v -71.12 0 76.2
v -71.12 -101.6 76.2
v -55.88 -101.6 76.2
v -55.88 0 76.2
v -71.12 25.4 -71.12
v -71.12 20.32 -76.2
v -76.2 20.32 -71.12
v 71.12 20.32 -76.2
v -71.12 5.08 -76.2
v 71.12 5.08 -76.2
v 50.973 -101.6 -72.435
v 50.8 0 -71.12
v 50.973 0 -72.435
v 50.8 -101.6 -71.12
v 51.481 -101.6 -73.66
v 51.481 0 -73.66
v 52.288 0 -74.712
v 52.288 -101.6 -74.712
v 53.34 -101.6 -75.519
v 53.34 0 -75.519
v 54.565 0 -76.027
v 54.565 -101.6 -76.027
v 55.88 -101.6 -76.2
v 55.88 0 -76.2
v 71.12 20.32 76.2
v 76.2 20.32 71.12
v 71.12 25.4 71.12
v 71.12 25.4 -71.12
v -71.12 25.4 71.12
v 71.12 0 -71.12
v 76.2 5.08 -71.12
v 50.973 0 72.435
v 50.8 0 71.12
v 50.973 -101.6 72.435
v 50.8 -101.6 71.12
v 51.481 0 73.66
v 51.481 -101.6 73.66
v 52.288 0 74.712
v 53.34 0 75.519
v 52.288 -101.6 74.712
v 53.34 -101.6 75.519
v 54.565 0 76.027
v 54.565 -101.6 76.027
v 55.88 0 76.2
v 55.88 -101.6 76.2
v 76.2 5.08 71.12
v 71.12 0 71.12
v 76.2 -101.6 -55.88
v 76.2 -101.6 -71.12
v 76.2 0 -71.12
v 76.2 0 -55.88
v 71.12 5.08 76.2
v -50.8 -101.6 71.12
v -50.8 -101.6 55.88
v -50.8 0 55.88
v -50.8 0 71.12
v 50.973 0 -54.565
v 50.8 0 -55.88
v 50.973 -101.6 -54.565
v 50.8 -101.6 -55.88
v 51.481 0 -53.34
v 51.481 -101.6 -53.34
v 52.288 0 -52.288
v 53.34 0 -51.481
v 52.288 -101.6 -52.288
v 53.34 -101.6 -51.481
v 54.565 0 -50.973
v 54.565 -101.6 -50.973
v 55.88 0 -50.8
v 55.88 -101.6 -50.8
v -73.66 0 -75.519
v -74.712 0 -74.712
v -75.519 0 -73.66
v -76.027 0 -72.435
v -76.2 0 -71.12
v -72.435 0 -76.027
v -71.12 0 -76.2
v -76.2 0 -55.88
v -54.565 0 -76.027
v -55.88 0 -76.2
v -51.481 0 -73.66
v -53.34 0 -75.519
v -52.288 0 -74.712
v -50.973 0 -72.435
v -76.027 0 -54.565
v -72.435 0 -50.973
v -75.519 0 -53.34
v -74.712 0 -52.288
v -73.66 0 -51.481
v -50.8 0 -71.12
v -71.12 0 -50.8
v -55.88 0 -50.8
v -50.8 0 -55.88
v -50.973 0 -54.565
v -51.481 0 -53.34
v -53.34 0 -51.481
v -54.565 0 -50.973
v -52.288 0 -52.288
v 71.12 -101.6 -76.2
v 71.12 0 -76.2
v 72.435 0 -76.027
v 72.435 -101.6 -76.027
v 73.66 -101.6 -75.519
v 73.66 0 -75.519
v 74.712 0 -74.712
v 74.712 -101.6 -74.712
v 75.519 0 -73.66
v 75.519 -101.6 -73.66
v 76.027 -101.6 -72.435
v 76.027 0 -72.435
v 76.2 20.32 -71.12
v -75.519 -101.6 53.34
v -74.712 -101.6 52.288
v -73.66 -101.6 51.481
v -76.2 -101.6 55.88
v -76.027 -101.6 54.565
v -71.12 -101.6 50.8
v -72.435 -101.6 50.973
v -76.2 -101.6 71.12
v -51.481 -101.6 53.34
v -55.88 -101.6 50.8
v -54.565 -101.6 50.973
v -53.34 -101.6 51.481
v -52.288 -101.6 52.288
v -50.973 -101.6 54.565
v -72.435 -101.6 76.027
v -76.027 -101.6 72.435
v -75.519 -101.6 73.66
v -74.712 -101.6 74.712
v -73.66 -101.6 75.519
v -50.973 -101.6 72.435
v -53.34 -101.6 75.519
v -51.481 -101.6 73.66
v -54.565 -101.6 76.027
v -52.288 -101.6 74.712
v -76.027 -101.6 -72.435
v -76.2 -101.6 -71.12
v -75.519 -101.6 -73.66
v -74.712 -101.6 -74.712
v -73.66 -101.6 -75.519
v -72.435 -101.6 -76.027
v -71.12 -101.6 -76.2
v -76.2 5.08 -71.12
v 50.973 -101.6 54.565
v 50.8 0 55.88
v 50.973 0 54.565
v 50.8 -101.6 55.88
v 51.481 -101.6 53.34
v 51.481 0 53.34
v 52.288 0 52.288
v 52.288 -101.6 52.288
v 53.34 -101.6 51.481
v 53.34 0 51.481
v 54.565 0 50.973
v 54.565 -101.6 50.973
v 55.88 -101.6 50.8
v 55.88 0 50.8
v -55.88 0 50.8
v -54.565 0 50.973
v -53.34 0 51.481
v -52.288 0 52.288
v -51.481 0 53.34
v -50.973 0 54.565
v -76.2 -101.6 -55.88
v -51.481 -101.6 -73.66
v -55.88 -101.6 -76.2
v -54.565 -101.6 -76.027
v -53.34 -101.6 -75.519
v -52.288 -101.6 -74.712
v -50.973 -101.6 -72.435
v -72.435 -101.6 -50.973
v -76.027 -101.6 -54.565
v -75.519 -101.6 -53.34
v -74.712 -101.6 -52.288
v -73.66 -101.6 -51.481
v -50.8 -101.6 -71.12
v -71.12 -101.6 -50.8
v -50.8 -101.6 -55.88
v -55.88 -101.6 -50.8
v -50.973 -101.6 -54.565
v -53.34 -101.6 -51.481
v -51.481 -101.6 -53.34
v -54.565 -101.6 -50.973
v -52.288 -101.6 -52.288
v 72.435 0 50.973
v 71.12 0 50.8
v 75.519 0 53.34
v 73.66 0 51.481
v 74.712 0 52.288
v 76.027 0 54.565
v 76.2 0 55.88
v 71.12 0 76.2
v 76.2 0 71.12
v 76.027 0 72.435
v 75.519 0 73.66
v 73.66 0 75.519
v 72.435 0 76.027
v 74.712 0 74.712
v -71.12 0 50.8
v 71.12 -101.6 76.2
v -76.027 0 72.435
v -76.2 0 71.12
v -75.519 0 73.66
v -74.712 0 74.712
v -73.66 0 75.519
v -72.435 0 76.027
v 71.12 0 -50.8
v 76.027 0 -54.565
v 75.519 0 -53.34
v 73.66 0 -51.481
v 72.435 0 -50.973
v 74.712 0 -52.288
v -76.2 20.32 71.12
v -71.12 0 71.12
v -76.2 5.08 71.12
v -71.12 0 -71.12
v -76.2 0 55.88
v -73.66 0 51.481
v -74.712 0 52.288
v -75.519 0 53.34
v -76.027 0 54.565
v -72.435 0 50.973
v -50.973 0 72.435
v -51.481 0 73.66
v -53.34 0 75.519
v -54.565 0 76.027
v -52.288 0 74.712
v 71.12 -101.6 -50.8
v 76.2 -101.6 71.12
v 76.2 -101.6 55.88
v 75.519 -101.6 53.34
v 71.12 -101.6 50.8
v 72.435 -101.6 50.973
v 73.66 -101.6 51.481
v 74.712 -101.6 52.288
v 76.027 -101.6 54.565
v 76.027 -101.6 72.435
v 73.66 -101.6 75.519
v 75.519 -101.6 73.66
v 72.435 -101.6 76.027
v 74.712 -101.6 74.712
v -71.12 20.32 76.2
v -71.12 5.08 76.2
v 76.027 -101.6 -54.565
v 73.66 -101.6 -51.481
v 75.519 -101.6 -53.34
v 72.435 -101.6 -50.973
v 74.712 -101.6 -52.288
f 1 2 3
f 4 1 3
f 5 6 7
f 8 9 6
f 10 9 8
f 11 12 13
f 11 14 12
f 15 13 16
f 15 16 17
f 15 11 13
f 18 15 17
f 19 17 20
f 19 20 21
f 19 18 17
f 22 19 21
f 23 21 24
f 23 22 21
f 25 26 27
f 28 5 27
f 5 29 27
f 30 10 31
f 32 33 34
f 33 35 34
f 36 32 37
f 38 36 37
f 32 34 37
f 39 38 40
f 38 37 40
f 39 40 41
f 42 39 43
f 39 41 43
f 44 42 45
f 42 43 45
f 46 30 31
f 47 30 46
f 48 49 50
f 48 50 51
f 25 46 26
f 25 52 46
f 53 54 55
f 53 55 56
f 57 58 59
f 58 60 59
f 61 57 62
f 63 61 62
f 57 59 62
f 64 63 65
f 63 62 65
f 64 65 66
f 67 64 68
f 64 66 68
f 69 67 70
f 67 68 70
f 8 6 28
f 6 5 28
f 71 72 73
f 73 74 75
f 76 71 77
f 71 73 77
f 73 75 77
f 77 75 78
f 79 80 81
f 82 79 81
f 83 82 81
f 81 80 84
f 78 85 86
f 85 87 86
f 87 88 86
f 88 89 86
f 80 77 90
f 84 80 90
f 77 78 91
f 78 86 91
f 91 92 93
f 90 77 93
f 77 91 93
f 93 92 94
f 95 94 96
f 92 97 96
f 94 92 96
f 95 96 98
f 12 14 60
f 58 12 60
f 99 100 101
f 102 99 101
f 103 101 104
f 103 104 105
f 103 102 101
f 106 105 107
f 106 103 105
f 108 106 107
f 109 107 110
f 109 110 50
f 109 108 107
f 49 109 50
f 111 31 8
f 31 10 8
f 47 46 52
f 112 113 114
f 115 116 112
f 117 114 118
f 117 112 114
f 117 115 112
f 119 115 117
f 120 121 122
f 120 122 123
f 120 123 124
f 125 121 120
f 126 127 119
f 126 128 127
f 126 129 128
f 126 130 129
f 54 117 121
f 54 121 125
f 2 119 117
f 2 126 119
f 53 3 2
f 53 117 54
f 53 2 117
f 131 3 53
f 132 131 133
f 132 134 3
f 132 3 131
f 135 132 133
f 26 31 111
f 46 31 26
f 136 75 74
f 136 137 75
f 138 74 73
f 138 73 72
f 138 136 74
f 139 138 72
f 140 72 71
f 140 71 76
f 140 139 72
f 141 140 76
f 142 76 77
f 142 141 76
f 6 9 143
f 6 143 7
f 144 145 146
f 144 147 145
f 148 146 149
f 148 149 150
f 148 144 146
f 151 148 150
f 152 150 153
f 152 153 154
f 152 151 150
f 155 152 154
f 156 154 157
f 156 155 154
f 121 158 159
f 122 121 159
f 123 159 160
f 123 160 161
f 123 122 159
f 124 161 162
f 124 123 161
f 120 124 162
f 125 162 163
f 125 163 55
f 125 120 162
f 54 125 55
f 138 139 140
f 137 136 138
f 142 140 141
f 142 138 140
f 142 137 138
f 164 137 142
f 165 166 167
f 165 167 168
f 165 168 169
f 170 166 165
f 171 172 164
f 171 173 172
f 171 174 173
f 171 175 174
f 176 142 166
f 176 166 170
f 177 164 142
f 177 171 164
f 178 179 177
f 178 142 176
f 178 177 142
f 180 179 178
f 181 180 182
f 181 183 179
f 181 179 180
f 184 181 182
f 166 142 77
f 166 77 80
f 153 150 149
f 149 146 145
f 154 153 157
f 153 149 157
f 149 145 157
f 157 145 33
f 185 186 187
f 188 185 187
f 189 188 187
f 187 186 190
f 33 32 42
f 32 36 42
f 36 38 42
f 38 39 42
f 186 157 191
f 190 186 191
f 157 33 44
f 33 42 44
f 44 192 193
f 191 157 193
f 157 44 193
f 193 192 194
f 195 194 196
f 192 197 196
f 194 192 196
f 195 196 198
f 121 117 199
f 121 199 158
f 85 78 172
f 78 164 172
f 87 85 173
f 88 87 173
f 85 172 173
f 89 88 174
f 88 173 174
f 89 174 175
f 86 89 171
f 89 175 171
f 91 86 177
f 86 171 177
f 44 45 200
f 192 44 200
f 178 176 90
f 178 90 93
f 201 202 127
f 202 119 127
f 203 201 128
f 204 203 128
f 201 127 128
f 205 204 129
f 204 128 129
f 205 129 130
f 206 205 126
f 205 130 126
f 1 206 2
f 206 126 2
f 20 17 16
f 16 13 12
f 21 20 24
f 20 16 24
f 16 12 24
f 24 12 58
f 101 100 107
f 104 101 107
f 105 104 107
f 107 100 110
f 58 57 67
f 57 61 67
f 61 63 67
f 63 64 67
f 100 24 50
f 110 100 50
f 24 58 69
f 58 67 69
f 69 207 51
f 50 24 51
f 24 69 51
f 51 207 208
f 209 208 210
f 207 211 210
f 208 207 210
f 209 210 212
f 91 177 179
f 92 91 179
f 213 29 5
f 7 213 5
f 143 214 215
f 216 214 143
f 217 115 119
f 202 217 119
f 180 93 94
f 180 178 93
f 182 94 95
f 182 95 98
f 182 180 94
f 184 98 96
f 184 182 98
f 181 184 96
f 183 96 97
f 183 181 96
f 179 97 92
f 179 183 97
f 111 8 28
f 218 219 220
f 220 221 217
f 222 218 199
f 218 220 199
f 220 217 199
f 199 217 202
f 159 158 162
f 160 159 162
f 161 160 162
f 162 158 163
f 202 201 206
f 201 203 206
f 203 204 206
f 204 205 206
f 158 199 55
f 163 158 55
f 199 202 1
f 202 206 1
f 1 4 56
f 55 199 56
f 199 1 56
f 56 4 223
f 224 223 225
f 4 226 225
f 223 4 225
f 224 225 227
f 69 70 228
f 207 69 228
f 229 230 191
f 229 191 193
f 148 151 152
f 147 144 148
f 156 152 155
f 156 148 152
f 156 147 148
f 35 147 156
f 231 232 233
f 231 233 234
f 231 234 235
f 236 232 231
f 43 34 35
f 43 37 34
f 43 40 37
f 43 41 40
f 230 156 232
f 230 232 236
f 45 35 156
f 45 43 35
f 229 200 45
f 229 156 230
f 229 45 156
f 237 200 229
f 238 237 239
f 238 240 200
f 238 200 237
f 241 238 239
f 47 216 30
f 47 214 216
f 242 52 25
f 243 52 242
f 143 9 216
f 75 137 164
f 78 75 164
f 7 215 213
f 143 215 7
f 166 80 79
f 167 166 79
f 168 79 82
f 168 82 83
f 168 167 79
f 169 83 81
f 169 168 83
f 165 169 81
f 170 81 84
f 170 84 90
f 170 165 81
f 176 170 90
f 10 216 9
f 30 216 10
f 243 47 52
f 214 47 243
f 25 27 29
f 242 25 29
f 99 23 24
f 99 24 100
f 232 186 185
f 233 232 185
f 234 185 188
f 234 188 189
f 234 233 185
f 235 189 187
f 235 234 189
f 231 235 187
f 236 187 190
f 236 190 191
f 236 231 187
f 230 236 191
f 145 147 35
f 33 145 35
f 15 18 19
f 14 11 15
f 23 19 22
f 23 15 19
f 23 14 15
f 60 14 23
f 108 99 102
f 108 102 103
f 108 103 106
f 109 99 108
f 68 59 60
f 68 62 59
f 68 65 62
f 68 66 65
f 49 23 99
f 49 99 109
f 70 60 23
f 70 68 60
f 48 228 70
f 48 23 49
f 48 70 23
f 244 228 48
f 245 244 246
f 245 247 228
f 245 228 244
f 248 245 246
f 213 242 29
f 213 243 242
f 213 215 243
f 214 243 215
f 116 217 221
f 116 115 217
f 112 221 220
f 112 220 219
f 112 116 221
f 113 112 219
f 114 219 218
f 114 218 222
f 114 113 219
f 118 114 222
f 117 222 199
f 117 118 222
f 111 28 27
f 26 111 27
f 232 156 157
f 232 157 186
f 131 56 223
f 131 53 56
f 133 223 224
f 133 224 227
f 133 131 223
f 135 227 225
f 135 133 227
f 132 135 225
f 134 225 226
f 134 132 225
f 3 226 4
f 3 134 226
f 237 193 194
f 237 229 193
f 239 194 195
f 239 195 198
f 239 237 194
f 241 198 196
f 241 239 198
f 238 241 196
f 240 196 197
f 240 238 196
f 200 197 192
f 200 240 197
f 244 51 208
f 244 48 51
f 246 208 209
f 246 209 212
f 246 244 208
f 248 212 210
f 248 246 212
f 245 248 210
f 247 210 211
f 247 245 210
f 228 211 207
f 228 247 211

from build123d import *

# Parameters (mm, degrees)
F0_W     = 25.4
F0_H     = 25.4
F1_DEPTH = 101.6
F2_DEPTH = 25.4
F3_R     = 5.08
F4_R     = 5.08
F5_R     = 5.08
F6_R     = 5.08
F7_SIZE  = 5.08


with BuildPart() as f1:
    # F0 (on Front) → F1 (new body)
    with BuildSketch(Plane.XZ):
        with Locations((-63.5, 63.5)):
            Rectangle(F0_W, F0_H)
        with Locations((63.5, 63.5)):
            Rectangle(F0_W, F0_H)
        with Locations((63.5, -63.5)):
            Rectangle(F0_W, F0_H)
        with Locations((-63.5, -63.5)):
            Rectangle(F0_W, F0_H)
    extrude(amount=F1_DEPTH)

    # F3
    f3_edges = [f1.edges().sort_by_distance(p)[0] for p in [
        (76.2, -50.8, -50.8),
        (76.2, -50.8, -76.2),
        (50.8, -50.8, -76.2),
        (50.8, -50.8, -50.8),
    ]]
    fillet(f3_edges, radius=F3_R)

    # F4
    f4_edges = [f1.edges().sort_by_distance(p)[0] for p in [
        (-76.2, -50.8, -76.2),
        (-76.2, -50.8, -50.8),
        (-50.8, -50.8, -76.2),
        (-50.8, -50.8, -50.8),
    ]]
    fillet(f4_edges, radius=F4_R)

    # F5
    f5_edges = [f1.edges().sort_by_distance(p)[0] for p in [
        (76.2, -50.8, 50.8),
        (50.8, -50.8, 50.8),
        (76.2, -50.8, 76.2),
        (50.8, -50.8, 76.2),
    ]]
    fillet(f5_edges, radius=F5_R)

    # F6
    f6_edges = [f1.edges().sort_by_distance(p)[0] for p in [
        (-76.2, -50.8, 76.2),
        (-50.8, -50.8, 76.2),
        (-50.8, -50.8, 50.8),
        (-76.2, -50.8, 50.8),
    ]]
    fillet(f6_edges, radius=F6_R)


with BuildPart() as f2:
    # F0 (on Front) → F2 (new body)
    with BuildSketch(Plane.XZ):
        Polygon((50.8, 76.2), (-50.8, 76.2), (-50.8, 50.8), (-76.2, 50.8), (-76.2, -50.8), (-50.8, -50.8), (-50.8, -76.2), (50.8, -76.2), (50.8, -50.8), (76.2, -50.8), (76.2, 50.8), (50.8, 50.8), align=None)
        with Locations((63.5, -63.5)):
            Rectangle(F0_W, F0_H)
        with Locations((63.5, 63.5)):
            Rectangle(F0_W, F0_H)
        with Locations((-63.5, 63.5)):
            Rectangle(F0_W, F0_H)
        with Locations((-63.5, -63.5)):
            Rectangle(F0_W, F0_H)
    extrude(amount=-F2_DEPTH)

    # F7
    f7_edges = [f2.edges().sort_by_distance(p)[0] for p in [
        (0, 25.4, -76.2),
        (76.2, 12.7, -76.2),
        (0, 0, -76.2),
        (-76.2, 12.7, -76.2),
        (76.2, 12.7, 76.2),
        (76.2, 0, 0),
        (76.2, 25.4, 0),
        (0, 25.4, 76.2),
        (-76.2, 12.7, 76.2),
        (0, 0, 76.2),
        (-76.2, 25.4, 0),
        (-76.2, 0, 0),
    ]]
    chamfer(f7_edges, length=F7_SIZE)


solid = Compound([f1.part, f2.part])
